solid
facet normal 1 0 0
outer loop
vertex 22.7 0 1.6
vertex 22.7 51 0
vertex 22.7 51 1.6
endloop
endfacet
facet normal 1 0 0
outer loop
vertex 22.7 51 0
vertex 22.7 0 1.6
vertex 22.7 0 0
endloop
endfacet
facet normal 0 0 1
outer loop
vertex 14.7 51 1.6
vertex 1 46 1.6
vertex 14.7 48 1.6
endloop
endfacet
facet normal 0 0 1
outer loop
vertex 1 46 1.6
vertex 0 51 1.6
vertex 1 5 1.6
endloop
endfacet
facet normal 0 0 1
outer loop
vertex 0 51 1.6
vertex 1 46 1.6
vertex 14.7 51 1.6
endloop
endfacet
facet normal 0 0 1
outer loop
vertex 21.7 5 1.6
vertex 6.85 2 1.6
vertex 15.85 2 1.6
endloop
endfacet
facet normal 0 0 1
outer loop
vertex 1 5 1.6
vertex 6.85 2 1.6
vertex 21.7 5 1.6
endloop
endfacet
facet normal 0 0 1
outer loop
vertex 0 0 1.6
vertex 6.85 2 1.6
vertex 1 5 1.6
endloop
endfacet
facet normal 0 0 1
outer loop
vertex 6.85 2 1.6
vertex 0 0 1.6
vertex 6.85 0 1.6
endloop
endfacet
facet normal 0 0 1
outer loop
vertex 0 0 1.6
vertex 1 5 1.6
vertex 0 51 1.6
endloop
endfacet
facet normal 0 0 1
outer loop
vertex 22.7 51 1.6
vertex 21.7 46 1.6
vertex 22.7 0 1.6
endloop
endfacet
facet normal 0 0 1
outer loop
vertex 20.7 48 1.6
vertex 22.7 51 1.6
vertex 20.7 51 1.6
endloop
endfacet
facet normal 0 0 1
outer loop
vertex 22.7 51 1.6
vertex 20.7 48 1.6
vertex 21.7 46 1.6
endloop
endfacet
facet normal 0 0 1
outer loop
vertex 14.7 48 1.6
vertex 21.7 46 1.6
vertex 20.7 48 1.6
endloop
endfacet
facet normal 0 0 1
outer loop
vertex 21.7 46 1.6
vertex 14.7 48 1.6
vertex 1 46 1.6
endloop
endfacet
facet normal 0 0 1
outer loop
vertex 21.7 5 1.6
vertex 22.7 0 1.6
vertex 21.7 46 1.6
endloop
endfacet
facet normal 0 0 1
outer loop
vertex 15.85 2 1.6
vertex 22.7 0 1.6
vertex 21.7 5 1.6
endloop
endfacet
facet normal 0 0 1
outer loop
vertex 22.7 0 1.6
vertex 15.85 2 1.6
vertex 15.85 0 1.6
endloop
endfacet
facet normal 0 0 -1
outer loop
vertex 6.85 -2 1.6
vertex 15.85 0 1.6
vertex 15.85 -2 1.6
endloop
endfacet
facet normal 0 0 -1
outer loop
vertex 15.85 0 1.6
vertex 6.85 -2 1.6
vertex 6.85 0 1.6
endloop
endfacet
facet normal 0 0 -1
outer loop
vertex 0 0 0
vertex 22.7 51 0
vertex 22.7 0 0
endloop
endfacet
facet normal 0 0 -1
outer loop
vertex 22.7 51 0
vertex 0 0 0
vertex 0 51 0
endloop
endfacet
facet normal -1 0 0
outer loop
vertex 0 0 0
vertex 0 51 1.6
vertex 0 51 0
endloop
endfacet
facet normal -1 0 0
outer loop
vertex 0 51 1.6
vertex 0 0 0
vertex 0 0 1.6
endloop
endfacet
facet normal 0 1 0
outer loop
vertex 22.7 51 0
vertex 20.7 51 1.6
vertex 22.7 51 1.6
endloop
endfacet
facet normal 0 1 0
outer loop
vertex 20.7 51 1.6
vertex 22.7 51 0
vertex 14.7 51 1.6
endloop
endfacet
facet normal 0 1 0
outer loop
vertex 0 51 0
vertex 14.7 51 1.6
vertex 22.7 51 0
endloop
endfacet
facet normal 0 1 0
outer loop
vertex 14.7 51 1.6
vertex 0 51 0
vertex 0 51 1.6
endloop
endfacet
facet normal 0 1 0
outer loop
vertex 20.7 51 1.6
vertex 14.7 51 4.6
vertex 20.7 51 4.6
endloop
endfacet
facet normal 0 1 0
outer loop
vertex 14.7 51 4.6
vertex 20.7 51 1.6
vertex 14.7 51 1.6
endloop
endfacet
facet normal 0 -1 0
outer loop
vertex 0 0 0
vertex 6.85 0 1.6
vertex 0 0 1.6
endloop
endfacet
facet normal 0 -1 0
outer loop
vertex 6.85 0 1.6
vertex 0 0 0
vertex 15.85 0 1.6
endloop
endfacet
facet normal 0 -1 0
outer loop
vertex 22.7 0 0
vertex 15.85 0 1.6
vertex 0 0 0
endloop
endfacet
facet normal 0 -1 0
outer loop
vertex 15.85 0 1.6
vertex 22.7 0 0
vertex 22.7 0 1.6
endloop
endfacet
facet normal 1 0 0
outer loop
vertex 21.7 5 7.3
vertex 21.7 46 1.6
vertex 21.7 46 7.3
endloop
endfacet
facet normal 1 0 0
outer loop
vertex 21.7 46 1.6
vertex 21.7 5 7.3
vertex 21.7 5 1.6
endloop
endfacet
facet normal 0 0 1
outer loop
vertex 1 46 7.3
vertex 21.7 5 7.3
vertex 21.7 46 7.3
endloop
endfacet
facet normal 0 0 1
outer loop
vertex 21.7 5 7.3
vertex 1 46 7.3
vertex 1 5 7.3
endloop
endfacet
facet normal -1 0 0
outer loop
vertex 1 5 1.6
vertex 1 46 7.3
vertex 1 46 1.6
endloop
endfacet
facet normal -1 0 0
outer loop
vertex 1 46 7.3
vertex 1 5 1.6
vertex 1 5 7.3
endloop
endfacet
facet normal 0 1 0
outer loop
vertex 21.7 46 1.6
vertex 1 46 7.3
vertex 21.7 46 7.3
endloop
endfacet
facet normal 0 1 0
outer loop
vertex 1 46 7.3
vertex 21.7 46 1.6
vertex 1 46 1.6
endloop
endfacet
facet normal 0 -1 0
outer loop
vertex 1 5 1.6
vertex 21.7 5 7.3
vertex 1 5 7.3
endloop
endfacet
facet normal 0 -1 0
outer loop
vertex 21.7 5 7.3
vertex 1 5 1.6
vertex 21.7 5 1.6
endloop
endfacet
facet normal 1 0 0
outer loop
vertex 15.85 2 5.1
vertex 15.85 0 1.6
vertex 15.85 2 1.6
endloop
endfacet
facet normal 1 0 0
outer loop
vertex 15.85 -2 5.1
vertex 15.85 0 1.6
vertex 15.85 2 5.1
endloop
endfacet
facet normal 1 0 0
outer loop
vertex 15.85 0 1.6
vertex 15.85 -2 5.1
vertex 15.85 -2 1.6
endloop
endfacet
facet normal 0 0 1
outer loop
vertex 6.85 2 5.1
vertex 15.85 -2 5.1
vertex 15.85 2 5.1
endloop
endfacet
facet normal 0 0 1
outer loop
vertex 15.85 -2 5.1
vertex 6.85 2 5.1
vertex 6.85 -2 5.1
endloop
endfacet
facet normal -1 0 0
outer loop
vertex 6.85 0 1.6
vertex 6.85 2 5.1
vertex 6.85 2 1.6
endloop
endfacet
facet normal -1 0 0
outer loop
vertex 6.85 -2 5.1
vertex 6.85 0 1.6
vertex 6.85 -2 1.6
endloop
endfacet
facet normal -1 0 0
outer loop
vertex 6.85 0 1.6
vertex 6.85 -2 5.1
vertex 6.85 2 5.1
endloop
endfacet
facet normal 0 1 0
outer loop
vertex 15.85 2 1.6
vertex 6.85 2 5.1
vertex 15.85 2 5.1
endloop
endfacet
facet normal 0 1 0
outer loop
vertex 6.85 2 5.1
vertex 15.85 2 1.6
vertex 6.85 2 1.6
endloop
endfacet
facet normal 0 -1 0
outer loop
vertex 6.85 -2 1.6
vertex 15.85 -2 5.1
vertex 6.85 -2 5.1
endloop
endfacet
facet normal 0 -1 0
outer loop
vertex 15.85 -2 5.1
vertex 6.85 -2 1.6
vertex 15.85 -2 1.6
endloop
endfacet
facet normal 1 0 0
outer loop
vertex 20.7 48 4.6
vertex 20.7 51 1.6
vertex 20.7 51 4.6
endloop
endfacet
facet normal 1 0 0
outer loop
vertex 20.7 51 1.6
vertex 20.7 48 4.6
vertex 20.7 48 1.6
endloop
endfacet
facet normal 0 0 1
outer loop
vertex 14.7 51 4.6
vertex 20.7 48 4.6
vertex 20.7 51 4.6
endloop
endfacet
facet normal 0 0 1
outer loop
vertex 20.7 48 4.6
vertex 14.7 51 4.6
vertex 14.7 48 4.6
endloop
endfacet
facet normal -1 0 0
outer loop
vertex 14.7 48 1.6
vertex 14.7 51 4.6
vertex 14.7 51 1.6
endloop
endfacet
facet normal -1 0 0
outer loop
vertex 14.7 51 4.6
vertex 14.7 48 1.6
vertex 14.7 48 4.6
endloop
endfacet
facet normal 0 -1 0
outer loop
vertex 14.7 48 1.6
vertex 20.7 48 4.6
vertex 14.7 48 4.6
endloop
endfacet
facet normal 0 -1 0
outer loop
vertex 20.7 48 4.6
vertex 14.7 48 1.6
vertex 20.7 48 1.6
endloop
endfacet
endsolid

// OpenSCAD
// =============================================================================
// ESP32 Feather HUZZAH32 - Reference Model
// For fitment verification only - not for printing
// =============================================================================

// Include parameters (safe to include multiple times)
include <../parameters.scad>

module esp32_feather() {
    color(color_pcb) {
        // Main PCB
        cube([esp32_width, esp32_length, 1.6]);

        // Components on top (simplified block)
        translate([1, 5, 1.6])
            cube([esp32_width - 2, esp32_length - 10, esp32_height - 1.6]);

        // USB-C port (extending from one end)
        translate([(esp32_width - esp32_usb_width) / 2, -esp32_usb_protrusion, 1.6])
            cube([esp32_usb_width, esp32_usb_protrusion + 2, esp32_usb_height]);

        // JST battery connector (opposite end from USB)
        translate([esp32_width - 8, esp32_length - 3, 1.6])
            cube([6, 3, 3]);
    }
}

// Preview (renders when opening this file directly)
esp32_feather();
